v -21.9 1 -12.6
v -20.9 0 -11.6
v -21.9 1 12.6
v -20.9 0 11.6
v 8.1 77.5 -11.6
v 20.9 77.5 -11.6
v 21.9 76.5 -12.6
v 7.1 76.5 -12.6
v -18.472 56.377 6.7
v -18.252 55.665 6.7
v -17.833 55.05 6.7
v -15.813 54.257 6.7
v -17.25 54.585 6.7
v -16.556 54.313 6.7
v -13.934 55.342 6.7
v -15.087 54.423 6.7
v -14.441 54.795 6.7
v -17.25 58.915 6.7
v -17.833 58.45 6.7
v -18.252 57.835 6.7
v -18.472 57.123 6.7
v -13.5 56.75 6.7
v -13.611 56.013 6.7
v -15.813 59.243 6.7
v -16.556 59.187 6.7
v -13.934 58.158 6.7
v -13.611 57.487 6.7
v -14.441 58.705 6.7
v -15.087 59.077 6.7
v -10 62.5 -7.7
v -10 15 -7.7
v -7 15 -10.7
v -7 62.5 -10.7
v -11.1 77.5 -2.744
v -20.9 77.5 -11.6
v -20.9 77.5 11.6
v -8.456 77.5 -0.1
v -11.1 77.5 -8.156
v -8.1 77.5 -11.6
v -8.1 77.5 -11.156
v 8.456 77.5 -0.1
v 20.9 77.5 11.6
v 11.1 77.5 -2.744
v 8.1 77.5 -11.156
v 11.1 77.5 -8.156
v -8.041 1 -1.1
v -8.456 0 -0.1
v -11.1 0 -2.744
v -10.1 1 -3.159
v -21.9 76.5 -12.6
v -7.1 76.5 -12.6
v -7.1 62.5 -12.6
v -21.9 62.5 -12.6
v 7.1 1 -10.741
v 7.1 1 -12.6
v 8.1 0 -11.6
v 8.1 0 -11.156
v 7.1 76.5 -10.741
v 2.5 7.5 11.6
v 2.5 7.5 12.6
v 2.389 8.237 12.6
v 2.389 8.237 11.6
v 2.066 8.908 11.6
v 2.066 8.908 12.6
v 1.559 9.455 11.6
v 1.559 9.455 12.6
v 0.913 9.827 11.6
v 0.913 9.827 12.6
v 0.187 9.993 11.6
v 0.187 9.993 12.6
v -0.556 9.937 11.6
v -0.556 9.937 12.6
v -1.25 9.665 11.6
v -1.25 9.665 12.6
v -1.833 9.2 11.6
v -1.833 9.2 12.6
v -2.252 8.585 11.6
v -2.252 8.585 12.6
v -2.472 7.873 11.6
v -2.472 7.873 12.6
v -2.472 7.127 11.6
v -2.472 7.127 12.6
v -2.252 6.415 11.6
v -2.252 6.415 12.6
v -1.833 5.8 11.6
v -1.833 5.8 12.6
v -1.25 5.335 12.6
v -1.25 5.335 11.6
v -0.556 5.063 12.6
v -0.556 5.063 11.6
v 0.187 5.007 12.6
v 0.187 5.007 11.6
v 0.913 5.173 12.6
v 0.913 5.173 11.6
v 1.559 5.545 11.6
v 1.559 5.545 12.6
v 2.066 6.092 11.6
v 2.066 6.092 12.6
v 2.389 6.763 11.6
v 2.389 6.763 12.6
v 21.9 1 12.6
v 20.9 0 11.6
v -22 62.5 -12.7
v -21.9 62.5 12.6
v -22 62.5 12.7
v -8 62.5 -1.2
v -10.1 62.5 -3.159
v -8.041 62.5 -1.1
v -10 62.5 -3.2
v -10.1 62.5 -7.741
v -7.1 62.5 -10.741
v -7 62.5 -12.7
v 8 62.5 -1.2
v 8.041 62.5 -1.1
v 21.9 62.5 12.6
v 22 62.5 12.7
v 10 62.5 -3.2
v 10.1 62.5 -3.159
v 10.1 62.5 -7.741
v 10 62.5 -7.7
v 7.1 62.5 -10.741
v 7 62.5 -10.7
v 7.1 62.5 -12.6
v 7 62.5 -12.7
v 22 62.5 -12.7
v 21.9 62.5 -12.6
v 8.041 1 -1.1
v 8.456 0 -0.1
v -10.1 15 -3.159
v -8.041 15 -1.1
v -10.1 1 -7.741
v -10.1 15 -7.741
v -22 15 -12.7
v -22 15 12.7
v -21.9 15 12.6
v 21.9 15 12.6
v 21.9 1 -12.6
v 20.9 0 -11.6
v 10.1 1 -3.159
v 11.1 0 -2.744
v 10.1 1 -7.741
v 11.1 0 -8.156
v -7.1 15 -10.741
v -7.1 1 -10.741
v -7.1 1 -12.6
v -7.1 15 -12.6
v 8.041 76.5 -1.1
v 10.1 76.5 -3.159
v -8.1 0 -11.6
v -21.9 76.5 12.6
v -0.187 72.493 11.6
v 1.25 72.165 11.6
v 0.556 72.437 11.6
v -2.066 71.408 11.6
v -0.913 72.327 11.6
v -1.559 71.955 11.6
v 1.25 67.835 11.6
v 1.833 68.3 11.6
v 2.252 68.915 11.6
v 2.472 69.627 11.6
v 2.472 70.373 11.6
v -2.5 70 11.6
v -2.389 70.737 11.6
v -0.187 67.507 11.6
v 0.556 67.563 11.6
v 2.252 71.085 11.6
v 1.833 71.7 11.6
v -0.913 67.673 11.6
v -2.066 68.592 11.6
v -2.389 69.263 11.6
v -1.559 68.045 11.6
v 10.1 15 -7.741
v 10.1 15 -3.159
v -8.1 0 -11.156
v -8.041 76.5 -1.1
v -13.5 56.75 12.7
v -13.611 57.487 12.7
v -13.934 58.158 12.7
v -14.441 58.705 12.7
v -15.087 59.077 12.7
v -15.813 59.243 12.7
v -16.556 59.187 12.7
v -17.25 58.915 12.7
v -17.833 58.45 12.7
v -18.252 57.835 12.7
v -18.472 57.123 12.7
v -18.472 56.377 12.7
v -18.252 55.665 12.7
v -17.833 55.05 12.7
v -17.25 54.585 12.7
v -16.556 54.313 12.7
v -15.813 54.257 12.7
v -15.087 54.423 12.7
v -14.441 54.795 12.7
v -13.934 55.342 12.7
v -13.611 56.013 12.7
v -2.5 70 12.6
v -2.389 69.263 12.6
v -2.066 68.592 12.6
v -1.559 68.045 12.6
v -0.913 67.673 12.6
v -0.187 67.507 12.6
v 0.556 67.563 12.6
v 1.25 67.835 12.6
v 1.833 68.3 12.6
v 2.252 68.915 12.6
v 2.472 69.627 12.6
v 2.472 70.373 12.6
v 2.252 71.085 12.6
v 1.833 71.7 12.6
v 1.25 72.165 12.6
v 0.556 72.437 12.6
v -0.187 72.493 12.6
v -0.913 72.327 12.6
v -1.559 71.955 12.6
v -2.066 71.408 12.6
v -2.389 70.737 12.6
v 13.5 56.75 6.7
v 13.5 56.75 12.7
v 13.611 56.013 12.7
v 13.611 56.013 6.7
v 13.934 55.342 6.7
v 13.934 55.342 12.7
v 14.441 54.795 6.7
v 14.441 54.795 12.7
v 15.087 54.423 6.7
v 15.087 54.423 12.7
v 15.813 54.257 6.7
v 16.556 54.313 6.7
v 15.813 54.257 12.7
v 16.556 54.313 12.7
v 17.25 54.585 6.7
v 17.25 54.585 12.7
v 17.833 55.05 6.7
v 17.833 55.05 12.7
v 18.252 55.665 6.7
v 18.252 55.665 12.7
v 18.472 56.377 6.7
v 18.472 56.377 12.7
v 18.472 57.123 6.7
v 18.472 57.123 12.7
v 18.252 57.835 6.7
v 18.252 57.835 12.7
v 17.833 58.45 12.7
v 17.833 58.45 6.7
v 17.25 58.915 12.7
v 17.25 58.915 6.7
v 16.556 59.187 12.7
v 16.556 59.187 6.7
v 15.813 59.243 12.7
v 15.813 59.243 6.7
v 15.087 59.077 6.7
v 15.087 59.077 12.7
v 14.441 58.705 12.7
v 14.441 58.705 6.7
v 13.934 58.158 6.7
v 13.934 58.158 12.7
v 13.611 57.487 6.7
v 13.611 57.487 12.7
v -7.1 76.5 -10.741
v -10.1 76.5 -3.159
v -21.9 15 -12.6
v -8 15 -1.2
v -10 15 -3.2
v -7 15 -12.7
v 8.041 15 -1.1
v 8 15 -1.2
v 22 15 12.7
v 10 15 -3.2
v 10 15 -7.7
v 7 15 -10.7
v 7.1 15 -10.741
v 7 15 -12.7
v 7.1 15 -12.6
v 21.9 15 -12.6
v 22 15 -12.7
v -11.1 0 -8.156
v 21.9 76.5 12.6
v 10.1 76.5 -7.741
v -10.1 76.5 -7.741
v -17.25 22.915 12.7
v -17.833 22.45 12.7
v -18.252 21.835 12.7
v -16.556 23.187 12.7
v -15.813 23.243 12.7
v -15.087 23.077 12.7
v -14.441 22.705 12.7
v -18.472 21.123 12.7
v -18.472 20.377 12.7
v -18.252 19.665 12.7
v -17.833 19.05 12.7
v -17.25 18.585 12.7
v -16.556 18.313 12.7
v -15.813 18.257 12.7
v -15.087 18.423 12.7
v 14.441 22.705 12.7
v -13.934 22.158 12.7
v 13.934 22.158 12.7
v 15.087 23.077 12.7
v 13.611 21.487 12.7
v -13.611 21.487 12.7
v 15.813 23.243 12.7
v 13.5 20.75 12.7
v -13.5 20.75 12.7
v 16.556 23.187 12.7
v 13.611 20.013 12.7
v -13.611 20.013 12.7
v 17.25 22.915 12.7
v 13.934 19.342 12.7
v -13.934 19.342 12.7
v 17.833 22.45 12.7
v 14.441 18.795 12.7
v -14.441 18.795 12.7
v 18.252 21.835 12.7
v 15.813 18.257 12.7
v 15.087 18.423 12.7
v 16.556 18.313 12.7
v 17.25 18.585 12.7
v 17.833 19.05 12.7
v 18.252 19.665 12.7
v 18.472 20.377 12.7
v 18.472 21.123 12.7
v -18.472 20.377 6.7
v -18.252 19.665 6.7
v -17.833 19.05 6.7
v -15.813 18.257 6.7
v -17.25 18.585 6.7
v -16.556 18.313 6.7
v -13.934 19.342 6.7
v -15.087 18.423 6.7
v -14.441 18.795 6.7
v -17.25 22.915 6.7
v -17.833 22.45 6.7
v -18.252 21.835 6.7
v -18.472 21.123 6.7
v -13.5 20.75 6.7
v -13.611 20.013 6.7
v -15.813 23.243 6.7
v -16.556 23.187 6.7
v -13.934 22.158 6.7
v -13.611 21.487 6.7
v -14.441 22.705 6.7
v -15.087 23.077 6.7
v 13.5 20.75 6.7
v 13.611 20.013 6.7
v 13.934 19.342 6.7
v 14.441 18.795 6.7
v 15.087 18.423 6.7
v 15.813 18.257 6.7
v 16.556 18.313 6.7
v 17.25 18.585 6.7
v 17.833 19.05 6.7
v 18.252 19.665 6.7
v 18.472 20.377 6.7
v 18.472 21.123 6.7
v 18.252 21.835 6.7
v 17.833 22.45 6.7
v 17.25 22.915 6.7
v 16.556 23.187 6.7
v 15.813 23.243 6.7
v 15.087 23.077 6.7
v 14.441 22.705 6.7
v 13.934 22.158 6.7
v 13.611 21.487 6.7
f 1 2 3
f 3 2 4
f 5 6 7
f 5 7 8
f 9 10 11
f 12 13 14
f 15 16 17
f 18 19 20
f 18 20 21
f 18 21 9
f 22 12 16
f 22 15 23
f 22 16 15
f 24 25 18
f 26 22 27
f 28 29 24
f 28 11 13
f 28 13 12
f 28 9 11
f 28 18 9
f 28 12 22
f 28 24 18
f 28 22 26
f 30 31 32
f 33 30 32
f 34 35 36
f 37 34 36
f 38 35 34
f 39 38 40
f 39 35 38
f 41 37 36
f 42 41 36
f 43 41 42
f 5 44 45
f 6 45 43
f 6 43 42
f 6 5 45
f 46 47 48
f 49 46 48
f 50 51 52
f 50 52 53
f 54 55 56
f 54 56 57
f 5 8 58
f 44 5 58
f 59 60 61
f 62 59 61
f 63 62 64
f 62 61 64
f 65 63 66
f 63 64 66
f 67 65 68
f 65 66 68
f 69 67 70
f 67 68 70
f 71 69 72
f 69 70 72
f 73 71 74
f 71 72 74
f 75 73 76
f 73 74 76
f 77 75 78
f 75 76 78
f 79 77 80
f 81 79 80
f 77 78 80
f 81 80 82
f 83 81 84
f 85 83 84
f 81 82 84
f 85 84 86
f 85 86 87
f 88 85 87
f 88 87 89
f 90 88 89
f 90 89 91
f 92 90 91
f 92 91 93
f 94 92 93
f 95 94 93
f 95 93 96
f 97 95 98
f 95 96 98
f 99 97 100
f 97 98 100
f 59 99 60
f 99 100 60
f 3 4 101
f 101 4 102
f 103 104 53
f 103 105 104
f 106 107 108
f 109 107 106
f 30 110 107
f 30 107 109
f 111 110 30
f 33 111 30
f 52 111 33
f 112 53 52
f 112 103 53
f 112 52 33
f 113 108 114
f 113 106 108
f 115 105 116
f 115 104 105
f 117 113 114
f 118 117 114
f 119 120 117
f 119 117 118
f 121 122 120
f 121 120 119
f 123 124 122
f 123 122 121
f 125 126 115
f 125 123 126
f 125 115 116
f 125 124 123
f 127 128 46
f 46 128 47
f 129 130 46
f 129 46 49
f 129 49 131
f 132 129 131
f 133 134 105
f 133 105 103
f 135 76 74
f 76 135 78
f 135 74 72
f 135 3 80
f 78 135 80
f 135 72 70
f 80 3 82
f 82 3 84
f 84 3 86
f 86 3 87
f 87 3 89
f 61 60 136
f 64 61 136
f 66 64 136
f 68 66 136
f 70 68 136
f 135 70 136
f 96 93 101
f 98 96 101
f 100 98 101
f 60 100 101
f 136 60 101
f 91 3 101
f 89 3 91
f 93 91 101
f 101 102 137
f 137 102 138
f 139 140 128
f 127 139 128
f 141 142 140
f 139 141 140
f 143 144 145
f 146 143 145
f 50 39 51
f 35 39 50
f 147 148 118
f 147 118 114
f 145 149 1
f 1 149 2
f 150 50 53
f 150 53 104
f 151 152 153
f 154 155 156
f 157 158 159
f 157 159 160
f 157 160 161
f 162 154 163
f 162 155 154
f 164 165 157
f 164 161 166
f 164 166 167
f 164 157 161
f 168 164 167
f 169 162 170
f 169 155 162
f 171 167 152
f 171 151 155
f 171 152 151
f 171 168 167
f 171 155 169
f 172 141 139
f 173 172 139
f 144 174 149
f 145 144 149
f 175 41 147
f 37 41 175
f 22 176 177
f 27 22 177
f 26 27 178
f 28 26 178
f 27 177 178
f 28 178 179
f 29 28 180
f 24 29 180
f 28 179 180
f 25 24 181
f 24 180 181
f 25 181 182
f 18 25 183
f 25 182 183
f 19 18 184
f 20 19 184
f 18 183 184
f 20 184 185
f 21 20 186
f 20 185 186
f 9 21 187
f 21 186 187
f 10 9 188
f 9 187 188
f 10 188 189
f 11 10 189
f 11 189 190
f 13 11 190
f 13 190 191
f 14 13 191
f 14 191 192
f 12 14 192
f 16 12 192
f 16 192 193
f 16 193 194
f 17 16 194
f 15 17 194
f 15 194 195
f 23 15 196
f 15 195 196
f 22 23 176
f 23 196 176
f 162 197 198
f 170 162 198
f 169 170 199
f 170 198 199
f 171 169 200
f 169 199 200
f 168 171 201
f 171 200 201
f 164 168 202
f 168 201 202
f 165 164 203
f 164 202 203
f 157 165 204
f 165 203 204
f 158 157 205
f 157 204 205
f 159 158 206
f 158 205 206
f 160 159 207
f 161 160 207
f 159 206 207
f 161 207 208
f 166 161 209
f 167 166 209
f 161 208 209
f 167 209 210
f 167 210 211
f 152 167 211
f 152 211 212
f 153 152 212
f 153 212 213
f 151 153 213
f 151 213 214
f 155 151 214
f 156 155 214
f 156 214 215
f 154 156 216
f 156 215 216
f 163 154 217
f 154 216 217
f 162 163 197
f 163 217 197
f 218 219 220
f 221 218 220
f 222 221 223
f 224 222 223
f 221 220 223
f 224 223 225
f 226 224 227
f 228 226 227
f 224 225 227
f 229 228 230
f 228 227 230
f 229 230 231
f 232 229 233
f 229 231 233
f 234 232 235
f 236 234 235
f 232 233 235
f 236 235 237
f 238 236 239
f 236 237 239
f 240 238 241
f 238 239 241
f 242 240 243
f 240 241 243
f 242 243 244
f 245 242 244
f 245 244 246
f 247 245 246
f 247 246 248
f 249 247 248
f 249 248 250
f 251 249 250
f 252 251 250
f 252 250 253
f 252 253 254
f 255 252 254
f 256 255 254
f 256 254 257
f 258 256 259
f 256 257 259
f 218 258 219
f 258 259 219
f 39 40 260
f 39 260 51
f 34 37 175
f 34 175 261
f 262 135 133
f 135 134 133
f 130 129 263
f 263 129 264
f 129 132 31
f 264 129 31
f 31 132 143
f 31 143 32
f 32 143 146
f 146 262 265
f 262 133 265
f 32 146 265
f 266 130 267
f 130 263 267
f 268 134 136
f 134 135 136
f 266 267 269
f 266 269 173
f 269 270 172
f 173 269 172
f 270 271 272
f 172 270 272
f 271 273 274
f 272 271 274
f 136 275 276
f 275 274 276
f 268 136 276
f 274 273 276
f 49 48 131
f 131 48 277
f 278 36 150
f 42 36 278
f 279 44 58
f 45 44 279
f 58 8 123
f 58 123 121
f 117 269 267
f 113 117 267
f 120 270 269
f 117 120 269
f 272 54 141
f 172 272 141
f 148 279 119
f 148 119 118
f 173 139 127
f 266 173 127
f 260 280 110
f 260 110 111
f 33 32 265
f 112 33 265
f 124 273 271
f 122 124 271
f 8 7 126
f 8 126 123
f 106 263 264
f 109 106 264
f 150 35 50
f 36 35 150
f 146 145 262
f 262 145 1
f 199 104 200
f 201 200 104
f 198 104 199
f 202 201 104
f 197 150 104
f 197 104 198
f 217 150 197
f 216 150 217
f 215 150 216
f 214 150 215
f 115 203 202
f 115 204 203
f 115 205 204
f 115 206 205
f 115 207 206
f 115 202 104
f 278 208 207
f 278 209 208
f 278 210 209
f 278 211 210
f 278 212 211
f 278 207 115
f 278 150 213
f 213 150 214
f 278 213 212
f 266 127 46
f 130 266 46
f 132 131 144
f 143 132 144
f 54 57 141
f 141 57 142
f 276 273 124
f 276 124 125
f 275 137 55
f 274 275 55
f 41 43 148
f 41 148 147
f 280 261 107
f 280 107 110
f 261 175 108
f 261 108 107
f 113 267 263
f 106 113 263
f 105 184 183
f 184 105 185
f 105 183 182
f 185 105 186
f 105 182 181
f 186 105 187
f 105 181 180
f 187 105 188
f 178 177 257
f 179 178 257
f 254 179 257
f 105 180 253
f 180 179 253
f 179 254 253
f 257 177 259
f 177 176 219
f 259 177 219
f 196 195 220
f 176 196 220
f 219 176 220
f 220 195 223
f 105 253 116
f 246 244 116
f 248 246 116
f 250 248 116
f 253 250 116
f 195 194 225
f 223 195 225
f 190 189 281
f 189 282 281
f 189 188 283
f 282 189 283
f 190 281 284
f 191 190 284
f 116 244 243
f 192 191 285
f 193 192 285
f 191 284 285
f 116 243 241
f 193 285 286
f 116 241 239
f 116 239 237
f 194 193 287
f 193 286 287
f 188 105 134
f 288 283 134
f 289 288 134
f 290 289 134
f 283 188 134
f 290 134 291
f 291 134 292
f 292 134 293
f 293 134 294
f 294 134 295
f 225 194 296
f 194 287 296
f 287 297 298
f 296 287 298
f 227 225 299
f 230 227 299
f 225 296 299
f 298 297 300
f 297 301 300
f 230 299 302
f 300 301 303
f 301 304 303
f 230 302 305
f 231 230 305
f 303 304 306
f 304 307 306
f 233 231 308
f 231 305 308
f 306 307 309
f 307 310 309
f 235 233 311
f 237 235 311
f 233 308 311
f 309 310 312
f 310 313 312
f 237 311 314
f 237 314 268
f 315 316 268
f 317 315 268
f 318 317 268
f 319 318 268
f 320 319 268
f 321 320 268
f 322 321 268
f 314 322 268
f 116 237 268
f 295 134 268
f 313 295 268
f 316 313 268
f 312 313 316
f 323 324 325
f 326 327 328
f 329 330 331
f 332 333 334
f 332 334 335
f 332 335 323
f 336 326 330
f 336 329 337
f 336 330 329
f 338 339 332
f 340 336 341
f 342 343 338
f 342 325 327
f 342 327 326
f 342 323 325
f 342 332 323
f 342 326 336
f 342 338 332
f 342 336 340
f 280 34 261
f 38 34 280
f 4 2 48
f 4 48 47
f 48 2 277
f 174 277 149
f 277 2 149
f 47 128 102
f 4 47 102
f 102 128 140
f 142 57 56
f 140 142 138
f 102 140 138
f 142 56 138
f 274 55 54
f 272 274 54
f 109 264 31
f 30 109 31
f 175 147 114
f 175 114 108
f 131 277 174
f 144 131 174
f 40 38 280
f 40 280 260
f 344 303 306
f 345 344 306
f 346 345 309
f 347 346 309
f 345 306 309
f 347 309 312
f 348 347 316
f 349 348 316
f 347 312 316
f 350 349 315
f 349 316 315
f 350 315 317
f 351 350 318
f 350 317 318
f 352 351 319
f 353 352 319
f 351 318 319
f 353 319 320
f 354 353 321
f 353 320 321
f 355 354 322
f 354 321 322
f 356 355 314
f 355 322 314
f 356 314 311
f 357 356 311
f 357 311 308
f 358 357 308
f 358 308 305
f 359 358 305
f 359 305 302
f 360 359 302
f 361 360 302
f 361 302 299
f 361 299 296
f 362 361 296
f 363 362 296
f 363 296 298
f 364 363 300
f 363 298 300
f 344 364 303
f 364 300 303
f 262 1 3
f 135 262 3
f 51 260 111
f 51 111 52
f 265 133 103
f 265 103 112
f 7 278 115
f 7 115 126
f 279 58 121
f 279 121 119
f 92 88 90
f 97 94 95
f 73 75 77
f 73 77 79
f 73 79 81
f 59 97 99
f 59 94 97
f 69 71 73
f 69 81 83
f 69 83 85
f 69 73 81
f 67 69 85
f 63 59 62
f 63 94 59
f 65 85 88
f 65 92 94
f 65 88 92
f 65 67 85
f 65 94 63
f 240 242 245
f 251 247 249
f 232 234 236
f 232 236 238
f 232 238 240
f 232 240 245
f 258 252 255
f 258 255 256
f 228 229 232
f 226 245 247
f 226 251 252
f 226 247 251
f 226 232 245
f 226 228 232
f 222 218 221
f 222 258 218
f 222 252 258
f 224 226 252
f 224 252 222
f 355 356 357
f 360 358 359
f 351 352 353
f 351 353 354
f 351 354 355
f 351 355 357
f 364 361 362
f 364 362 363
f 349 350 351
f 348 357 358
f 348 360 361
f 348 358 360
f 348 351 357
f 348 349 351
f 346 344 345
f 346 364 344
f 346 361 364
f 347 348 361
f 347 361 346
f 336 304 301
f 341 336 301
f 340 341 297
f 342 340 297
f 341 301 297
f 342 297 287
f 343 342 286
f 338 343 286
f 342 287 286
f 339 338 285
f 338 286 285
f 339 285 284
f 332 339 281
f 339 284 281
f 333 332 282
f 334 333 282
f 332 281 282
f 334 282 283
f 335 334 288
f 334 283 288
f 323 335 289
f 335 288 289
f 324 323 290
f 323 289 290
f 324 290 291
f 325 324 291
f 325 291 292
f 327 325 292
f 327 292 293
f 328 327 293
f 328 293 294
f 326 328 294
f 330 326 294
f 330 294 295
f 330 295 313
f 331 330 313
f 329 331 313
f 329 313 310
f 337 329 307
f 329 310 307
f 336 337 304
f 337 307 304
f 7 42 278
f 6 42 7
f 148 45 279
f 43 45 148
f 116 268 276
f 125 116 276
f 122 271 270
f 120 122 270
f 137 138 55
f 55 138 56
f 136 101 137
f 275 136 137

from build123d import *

# Parameters (mm, degrees)
SKETCH_1_W          = 44
SKETCH_1_H          = 25.4
EXTRUDE_1_DEPTH     = 77.5
CUT_EXTRUDE_1_DEPTH = 82.556973951
SKETCH_3_R          = 2.5
CUT_EXTRUDE_2_DEPTH = 6
CUT_EXTRUDE_3_DEPTH = 15
SKETCH_5_R          = 2.5
CUT_EXTRUDE_4_DEPTH = 1
CHAMFER_1_SIZE      = 1


with BuildPart() as part:
    # 草图1 → 凸台-拉伸1 (new body)
    with BuildSketch(Plane(origin=(0, 0, 0), x_dir=(1, 0, 0), z_dir=(0, 1, 0))):
        Rectangle(SKETCH_1_W, SKETCH_1_H)
    extrude(amount=EXTRUDE_1_DEPTH)

    # 草图2 → 切除-拉伸1 (cut, through all)
    with BuildSketch(Plane.XZ):
        Polygon((8, -1.2), (-8, -1.2), (-10, -3.2), (-10, -7.7), (-7, -10.7), (-7, -12.7), (7, -12.7), (7, -10.7), (10, -7.7), (10, -3.2), align=None)
    extrude(amount=-CUT_EXTRUDE_1_DEPTH, mode=Mode.SUBTRACT)

    # 草图3 → 切除-拉伸2 (cut)
    with BuildSketch(Plane.XY.offset(12.7)):
        with Locations((-16, 20.75)):
            Circle(SKETCH_3_R)
        with Locations((-16, 56.75)):
            Circle(SKETCH_3_R)
        with Locations(Location((16, 56.75, 0), (0, 0, 180))):
            Circle(SKETCH_3_R)
        with Locations(Location((16, 20.75, 0), (0, 0, 180))):
            Circle(SKETCH_3_R)
    extrude(amount=-CUT_EXTRUDE_2_DEPTH, mode=Mode.SUBTRACT)

    # 草图4 → 切除-拉伸3 (cut)
    with BuildSketch(Plane(origin=(0, 77.5, 0), x_dir=(1, 0, 0), z_dir=(0, 1, 0))):
        Polygon((22, -12.7), (22, 12.7), (7, 12.7), (7, 10.7), (10, 7.7), (10, 3.2), (8, 1.2), (-8, 1.2), (-10, 3.2), (-10, 7.7), (-7, 10.7), (-7, 12.7), (-22, 12.7), (-22, -12.7), align=None)
        Polygon((21.9, -12.6), (21.9, 12.6), (7.1, 12.6), (7.1, 10.741421356), (10.1, 7.741421356), (10.1, 3.158578644), (8.041421356, 1.1), (-8.041421356, 1.1), (-10.1, 3.158578644), (-10.1, 7.741421356), (-7.1, 10.741421356), (-7.1, 12.6), (-21.9, 12.6), (-21.9, -12.6), align=None, mode=Mode.SUBTRACT)
    cut_extrude_3 = extrude(amount=-CUT_EXTRUDE_3_DEPTH, mode=Mode.SUBTRACT)

    # 镜向1: 切除-拉伸3 across plane
    add(cut_extrude_3.mirror(Plane.ZX.offset(38.75)), mode=Mode.SUBTRACT)

    # 草图5 → 切除-拉伸4 (cut)
    with BuildSketch(Plane.XY.offset(12.6)):
        with Locations((0, 7.5)):
            Circle(SKETCH_5_R)
        with Locations(Location((0, 70, 0), (0, 0, 180))):
            Circle(SKETCH_5_R)
    extrude(amount=-CUT_EXTRUDE_4_DEPTH, mode=Mode.SUBTRACT)

    # 倒角1
    chamfer_1_edges = [part.edges().sort_by_distance(p)[0] for p in [
        (21.9, 0, 0),
        (14.5, 0, -12.6),
        (7.1, 0, -11.670710678),
        (8.6, 0, -9.241421356),
        (10.1, 0, -5.45),
        (9.070710678, 0, -2.129289322),
        (0, 0, -1.1),
        (-9.070710678, 0, -2.129289322),
        (-10.1, 0, -5.45),
        (-8.6, 0, -9.241421356),
        (-7.1, 0, -11.670710678),
        (-14.5, 0, -12.6),
        (-21.9, 0, 0),
        (0, 0, 12.6),
        (21.9, 77.5, 0),
        (14.5, 77.5, -12.6),
        (7.1, 77.5, -11.670710678),
        (8.6, 77.5, -9.241421356),
        (10.1, 77.5, -5.45),
        (9.070710678, 77.5, -2.129289322),
        (0, 77.5, -1.1),
        (-9.070710678, 77.5, -2.129289322),
        (-10.1, 77.5, -5.45),
        (-8.6, 77.5, -9.241421356),
        (-7.1, 77.5, -11.670710678),
        (-14.5, 77.5, -12.6),
        (-21.9, 77.5, 0),
        (0, 77.5, 12.6),
    ]]
    chamfer(chamfer_1_edges, length=CHAMFER_1_SIZE)


solid = part.part
